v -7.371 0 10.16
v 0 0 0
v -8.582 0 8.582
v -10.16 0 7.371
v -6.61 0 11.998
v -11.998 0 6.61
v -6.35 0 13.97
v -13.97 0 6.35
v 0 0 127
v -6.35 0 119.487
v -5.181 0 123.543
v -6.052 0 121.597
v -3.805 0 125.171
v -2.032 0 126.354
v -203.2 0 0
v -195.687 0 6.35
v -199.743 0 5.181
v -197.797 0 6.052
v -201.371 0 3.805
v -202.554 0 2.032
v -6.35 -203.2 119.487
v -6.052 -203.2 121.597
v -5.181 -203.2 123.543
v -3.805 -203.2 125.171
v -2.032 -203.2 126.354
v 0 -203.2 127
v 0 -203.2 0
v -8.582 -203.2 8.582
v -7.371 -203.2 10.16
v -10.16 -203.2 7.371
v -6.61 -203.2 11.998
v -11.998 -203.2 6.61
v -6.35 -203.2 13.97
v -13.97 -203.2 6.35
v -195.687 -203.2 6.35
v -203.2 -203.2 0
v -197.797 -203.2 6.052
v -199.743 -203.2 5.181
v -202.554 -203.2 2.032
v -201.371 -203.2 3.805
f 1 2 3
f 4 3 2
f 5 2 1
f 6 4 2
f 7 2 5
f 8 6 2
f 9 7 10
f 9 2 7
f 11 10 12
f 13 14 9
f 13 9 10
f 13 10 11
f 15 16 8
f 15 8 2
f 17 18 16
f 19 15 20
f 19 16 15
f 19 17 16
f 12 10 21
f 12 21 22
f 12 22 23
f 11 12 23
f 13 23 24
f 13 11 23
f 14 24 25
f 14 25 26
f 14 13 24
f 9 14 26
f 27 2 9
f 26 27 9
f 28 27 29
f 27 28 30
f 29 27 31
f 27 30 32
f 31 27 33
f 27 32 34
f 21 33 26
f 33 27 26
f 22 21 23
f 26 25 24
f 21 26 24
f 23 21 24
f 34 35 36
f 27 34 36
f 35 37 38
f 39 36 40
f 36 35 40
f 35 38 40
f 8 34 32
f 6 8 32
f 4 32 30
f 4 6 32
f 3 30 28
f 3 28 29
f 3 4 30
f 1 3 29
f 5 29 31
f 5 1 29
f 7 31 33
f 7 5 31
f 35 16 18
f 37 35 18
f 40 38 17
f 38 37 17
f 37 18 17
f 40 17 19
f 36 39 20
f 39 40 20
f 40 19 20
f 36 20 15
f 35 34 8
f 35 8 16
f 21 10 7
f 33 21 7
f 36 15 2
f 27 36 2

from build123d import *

# Parameters (mm, degrees)
F1_DEPTH    = 203.2
F2_T1_DEPTH = 203.2
F2_T3_DEPTH = 240.7671066227
F2_T5_DEPTH = 240.7671066227


# Not quite as in the source:
# - a fillet or chamfer that OpenCascade refuses, or shapes differently, is made with other operations: its cross-section is extruded or revolved along the edge and cut away or added


with BuildPart() as f1:
    # F0 (on Front) → F1 (new body)
    with BuildSketch(Plane.XZ):
        Polygon((-203.2, 0), (0, 0), (0, 127), (-6.35, 127), (-6.35, 6.35), (-203.2, 6.35), align=None)
    extrude(amount=F1_DEPTH)

    # F2: fillet of radius 7.62 on 3 edges, made by hand

    # F2_s2 → F2_t1 (join)
    with BuildSketch(Plane.XZ):
        with BuildLine():
            ThreePointArc((-13.97, 6.35), (-8.5818463274, 8.5818463274), (-6.35, 13.97))
            Line((-6.35, 13.97), (-6.35, 6.35))
            Line((-6.35, 6.35), (-13.97, 6.35))
        make_face()
    extrude(amount=F2_T1_DEPTH)

    # F2_s4 → F2_t3 (cut)
    with BuildSketch(Plane.XZ.offset(-18.7835533113)):
        with BuildLine():
            ThreePointArc((-195.6865786755, 6.35), (-200.6052675251, 4.5498711326), (-203.2, 0))
            Line((-203.2, 0), (-203.2, 6.35))
            Line((-203.2, 6.35), (-195.6865786755, 6.35))
        make_face()
    extrude(amount=F2_T3_DEPTH, mode=Mode.SUBTRACT)

    # F2_s6 → F2_t5 (cut)
    with BuildSketch(Plane.XZ.offset(-18.7835533113)):
        with BuildLine():
            ThreePointArc((-6.35, 119.4865786755), (-4.5498711326, 124.4052675251), (0, 127))
            Line((0, 127), (-6.35, 127))
            Line((-6.35, 127), (-6.35, 119.4865786755))
        make_face()
    extrude(amount=F2_T5_DEPTH, mode=Mode.SUBTRACT)


solid = f1.part
